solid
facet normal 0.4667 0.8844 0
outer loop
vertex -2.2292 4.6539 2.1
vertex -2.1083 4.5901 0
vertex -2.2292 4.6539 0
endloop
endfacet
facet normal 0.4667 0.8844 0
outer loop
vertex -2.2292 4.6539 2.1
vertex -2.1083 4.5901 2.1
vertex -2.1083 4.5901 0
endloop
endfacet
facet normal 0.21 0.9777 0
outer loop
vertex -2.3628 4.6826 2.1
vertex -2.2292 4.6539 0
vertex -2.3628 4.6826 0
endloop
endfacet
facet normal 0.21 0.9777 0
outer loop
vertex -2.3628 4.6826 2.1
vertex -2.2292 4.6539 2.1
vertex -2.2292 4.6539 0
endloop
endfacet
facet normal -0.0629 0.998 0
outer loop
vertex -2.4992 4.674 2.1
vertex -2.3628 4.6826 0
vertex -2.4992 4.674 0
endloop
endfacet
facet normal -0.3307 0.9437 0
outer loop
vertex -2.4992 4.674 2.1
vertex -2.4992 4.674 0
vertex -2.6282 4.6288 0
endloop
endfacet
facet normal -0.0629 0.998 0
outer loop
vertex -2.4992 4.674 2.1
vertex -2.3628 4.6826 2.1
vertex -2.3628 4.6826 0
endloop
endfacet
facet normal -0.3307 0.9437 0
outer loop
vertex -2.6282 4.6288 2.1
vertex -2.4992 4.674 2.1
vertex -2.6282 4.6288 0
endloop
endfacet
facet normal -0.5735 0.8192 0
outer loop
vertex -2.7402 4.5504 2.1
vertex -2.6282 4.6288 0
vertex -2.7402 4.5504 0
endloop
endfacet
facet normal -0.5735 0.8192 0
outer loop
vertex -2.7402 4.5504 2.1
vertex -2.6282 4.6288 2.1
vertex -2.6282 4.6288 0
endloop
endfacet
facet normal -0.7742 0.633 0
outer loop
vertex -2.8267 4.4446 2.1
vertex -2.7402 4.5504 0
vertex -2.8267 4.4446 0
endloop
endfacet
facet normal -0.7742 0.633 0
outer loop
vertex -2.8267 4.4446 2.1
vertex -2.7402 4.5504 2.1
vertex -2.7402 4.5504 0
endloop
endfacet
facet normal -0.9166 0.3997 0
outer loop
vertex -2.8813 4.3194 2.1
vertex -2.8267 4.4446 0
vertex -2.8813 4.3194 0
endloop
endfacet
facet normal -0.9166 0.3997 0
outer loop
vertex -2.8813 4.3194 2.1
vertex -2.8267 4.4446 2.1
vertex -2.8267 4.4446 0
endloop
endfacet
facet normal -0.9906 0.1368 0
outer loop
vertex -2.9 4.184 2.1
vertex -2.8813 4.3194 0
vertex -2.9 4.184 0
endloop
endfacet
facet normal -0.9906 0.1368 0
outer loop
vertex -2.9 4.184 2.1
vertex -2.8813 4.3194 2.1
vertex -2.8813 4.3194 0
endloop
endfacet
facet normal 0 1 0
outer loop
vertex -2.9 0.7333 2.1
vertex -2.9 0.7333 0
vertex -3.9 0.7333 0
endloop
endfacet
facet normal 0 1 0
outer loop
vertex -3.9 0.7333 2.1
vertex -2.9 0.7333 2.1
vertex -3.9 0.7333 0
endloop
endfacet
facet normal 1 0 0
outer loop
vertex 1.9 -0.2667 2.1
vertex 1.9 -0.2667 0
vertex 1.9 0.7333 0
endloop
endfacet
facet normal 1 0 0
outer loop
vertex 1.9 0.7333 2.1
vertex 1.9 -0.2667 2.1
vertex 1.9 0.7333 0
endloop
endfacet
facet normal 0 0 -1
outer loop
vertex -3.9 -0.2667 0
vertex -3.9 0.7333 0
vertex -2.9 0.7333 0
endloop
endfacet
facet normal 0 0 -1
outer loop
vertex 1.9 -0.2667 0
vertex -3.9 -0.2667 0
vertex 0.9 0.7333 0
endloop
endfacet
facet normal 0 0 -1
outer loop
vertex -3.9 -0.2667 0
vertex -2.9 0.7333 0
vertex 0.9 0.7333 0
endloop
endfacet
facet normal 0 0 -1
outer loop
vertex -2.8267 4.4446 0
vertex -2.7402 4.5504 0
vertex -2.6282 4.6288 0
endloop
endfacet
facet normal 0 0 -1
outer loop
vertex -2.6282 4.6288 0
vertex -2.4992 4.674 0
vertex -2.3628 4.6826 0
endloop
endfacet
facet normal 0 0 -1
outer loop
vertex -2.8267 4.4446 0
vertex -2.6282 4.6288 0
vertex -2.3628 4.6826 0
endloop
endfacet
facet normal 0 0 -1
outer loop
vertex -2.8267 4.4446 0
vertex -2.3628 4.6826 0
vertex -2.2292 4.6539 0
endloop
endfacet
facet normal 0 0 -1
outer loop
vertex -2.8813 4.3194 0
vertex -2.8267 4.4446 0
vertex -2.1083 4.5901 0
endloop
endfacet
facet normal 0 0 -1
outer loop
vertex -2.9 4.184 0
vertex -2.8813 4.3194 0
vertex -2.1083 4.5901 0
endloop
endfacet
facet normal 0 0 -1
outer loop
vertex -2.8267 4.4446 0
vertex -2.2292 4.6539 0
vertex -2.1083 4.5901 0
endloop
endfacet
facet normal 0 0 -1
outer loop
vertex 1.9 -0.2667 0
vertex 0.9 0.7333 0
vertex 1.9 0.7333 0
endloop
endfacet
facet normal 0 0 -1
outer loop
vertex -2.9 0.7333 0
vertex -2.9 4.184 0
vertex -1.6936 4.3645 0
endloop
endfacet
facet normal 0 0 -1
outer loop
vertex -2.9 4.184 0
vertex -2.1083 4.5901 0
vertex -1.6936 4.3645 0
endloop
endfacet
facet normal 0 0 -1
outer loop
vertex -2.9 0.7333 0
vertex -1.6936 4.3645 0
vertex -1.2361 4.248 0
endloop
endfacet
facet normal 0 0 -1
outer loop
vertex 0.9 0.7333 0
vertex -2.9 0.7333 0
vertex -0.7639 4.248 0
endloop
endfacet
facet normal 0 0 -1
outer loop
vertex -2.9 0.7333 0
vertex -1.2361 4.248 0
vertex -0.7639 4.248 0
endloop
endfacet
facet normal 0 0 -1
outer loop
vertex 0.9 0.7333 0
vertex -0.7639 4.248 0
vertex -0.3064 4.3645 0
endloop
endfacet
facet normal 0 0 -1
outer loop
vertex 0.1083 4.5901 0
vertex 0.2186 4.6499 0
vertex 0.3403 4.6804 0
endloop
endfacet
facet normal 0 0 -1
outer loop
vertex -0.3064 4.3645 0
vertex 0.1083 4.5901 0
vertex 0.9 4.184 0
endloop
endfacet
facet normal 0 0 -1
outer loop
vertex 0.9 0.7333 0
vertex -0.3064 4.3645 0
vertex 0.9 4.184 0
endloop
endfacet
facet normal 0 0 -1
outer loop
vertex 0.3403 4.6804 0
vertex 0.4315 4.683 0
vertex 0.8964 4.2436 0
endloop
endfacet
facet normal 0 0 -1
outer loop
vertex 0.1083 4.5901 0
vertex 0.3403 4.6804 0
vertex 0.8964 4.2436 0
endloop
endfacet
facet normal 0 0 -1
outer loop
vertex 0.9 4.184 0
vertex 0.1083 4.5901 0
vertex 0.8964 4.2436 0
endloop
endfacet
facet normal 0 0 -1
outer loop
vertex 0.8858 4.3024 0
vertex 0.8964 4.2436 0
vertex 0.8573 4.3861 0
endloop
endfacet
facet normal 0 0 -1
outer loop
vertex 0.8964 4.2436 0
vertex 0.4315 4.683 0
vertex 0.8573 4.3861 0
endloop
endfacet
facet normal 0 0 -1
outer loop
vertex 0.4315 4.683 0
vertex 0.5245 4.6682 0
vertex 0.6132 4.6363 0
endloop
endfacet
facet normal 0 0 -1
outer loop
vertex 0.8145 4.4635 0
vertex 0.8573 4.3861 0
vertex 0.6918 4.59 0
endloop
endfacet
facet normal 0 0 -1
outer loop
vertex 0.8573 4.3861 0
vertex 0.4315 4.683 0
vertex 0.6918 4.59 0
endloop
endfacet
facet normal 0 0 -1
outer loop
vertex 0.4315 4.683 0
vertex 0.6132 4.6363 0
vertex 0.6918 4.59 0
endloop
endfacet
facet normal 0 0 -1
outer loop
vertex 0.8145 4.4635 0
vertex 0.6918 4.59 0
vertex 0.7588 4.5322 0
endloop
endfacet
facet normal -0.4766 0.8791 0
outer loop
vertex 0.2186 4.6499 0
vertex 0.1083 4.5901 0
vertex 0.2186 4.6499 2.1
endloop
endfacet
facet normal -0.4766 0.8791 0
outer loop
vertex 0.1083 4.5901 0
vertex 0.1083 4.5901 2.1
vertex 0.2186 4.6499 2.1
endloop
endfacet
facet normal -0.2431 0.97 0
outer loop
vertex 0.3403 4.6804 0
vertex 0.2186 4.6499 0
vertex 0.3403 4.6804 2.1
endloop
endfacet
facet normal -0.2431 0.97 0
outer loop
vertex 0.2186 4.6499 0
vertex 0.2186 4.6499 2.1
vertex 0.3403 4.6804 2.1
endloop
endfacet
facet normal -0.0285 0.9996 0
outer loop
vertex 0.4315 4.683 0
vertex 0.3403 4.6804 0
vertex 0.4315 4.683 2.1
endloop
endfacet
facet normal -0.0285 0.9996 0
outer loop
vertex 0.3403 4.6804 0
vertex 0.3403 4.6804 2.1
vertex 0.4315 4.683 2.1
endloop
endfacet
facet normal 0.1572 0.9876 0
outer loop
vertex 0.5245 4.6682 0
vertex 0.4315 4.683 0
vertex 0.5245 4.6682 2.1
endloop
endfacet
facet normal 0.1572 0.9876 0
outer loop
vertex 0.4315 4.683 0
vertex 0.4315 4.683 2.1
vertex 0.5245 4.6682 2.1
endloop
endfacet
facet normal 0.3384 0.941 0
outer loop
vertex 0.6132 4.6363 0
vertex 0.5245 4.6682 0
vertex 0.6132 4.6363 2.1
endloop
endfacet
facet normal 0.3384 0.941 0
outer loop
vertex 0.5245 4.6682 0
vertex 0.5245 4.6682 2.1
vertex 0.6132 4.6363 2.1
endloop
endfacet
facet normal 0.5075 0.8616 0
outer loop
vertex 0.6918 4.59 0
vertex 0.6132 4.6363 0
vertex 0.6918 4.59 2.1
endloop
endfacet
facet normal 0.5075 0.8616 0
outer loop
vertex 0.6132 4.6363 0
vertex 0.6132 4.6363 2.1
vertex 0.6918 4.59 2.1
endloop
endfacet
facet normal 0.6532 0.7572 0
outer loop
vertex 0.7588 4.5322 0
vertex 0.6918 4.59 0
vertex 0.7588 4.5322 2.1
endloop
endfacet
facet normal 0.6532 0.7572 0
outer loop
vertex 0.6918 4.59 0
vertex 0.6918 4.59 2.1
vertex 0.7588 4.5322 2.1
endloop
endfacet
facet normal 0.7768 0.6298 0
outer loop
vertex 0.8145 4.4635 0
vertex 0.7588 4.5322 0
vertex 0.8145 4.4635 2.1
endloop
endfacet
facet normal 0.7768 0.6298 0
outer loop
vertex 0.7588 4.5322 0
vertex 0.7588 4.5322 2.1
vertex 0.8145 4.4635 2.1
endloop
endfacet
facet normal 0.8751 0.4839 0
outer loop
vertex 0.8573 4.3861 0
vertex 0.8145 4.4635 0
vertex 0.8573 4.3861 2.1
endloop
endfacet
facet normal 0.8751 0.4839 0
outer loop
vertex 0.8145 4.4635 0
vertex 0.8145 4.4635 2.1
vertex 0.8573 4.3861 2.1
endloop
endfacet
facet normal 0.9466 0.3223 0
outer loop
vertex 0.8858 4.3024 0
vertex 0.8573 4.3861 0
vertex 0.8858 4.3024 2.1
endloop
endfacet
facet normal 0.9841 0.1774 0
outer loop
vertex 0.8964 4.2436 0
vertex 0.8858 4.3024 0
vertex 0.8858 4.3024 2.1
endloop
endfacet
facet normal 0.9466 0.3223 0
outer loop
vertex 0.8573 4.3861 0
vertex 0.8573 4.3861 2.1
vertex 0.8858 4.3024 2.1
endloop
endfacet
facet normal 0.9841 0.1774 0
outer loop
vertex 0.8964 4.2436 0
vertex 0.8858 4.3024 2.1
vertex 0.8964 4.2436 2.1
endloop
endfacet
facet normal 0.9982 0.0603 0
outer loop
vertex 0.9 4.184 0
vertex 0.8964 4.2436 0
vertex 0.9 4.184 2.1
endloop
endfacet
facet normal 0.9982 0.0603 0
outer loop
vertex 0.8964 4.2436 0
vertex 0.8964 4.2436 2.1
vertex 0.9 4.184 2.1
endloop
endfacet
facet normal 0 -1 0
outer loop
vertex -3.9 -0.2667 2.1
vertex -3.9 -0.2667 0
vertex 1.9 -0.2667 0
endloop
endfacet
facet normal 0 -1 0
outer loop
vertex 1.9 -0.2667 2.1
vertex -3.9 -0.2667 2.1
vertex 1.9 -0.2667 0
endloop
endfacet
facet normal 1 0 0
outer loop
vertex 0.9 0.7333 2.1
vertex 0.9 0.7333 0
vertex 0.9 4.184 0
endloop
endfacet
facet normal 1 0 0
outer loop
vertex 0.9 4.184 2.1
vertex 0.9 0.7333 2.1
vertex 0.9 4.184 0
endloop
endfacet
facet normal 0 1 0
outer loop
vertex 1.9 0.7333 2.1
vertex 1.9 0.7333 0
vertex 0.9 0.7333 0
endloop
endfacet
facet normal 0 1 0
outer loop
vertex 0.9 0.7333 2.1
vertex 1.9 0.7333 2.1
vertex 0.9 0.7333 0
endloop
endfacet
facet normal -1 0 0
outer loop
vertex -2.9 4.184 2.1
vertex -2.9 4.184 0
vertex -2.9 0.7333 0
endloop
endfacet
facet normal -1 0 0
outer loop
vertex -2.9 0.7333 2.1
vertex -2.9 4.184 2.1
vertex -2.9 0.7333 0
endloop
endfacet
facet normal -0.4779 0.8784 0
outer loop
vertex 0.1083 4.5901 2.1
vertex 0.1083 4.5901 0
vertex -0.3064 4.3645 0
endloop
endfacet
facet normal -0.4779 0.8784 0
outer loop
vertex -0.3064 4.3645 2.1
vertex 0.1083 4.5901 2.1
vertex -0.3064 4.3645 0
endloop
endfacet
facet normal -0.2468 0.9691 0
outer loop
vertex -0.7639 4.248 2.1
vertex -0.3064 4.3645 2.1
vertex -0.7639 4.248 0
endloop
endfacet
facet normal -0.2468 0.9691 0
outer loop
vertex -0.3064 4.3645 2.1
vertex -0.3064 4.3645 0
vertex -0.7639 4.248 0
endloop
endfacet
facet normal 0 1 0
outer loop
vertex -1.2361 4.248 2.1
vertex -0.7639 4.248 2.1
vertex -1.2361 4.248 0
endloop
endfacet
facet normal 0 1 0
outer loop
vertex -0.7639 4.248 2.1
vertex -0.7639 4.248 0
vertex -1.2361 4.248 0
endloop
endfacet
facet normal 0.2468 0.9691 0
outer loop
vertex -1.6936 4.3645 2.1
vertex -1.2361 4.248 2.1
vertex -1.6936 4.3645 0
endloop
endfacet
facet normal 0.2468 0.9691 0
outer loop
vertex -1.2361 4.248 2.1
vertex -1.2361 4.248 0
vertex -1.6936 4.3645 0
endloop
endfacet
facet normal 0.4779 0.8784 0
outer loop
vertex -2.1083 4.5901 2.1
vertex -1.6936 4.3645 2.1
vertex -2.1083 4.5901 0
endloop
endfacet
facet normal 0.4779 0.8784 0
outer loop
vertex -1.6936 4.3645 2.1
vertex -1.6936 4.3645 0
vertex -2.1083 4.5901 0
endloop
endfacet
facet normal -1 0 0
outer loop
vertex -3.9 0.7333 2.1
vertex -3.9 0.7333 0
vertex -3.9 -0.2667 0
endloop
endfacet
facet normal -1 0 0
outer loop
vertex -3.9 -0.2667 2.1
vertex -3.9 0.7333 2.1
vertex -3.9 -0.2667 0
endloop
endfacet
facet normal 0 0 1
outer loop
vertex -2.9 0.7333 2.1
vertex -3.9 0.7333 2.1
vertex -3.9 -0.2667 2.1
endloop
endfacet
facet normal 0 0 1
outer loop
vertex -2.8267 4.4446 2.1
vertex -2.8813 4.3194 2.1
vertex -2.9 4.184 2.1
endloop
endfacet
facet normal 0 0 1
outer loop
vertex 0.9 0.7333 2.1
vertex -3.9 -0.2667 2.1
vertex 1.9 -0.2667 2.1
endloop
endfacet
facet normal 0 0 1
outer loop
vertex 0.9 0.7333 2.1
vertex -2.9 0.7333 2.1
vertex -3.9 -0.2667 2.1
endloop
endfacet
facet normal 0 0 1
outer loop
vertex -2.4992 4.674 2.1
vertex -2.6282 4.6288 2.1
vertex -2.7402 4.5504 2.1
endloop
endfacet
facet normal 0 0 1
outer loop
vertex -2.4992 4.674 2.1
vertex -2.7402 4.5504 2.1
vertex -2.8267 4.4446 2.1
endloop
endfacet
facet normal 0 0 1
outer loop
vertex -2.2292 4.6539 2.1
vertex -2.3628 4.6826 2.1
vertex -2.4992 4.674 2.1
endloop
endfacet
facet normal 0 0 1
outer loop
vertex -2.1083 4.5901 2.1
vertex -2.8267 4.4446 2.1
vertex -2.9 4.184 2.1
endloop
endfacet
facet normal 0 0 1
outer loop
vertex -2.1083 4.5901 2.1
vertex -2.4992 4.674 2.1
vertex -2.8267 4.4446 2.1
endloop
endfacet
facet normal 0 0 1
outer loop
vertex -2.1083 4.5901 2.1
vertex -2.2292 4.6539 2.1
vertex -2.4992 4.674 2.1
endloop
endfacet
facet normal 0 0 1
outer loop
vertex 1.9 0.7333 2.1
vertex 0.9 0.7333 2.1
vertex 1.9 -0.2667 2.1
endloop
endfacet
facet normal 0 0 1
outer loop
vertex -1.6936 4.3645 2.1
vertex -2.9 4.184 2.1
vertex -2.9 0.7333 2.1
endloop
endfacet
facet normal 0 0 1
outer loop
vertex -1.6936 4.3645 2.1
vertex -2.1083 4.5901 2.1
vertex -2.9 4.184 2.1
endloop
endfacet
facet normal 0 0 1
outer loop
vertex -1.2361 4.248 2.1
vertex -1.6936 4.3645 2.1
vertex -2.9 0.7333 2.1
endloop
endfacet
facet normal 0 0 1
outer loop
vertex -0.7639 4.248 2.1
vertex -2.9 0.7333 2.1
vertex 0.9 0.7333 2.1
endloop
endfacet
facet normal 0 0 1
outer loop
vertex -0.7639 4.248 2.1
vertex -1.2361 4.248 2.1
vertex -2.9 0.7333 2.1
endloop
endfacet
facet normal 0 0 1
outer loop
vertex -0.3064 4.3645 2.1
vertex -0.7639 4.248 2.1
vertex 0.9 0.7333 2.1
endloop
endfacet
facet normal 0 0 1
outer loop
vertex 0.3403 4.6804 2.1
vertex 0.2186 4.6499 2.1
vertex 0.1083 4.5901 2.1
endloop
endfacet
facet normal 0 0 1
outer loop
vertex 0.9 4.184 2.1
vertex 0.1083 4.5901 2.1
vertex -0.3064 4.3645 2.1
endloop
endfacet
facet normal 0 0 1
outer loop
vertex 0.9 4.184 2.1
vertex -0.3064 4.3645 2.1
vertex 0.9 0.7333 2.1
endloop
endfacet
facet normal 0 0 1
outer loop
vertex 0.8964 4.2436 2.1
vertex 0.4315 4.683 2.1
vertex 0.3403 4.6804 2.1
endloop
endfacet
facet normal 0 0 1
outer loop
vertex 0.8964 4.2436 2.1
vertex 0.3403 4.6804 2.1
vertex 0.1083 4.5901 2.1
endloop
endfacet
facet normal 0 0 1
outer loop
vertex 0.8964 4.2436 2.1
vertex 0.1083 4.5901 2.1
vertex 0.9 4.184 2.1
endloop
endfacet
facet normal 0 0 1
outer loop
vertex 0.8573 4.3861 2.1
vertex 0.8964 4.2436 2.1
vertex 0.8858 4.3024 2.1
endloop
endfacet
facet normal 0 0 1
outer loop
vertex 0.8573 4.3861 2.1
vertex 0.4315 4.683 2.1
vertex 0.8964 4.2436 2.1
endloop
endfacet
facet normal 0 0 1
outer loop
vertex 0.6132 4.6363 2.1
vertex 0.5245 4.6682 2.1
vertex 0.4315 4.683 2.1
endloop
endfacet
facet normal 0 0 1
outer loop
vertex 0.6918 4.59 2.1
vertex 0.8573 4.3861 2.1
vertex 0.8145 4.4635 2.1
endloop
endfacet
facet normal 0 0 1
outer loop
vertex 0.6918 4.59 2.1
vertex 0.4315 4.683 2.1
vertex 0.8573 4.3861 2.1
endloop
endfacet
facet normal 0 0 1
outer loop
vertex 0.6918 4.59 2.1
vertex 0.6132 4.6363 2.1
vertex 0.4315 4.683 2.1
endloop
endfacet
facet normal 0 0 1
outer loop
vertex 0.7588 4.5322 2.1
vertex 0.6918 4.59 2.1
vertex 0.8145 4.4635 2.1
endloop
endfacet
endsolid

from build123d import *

# Parameters (mm, degrees)
F1_DEPTH = 2.1
F2_F1_R  = 0.5
F2_F2_R  = 0.5


with BuildPart() as f1:
    # F0 (on Top) → F1 (new body)
    with BuildSketch(Plane.XY):
        with BuildLine():
            Line((-3.9, 0.7333275447), (-3.9, -0.2666724553))
            Line((-3.9, -0.2666724553), (1.9, -0.2666724553))
            Line((1.9, -0.2666724553), (1.9, 0.7333275447))
            Line((1.9, 0.7333275447), (0.9, 0.7333275447))
            Line((0.9, 0.7333275447), (0.9, 6.1333275447))
            ThreePointArc((0.9, 6.1333275447), (-1, 4.2333275447), (-2.9, 6.1333275447))
            Line((-2.9, 6.1333275447), (-2.9, 0.7333275447))
            Line((-2.9, 0.7333275447), (-3.9, 0.7333275447))
        make_face()
    extrude(amount=F1_DEPTH)

    # F2: fillet of radius 0.5 on 2 edges, made by hand

    # F2_f1
    f2_f1_edges = [f1.edges().sort_by_distance(p)[0] for p in [
        (-2.9, 6.1333275447, 1.05),
    ]]
    fillet(f2_f1_edges, radius=F2_F1_R)

    # F2_f2
    f2_f2_edges = [f1.edges().sort_by_distance(p)[0] for p in [
        (0.9, 6.1333275447, 1.05),
    ]]
    fillet(f2_f2_edges, radius=F2_F2_R)


solid = f1.part
